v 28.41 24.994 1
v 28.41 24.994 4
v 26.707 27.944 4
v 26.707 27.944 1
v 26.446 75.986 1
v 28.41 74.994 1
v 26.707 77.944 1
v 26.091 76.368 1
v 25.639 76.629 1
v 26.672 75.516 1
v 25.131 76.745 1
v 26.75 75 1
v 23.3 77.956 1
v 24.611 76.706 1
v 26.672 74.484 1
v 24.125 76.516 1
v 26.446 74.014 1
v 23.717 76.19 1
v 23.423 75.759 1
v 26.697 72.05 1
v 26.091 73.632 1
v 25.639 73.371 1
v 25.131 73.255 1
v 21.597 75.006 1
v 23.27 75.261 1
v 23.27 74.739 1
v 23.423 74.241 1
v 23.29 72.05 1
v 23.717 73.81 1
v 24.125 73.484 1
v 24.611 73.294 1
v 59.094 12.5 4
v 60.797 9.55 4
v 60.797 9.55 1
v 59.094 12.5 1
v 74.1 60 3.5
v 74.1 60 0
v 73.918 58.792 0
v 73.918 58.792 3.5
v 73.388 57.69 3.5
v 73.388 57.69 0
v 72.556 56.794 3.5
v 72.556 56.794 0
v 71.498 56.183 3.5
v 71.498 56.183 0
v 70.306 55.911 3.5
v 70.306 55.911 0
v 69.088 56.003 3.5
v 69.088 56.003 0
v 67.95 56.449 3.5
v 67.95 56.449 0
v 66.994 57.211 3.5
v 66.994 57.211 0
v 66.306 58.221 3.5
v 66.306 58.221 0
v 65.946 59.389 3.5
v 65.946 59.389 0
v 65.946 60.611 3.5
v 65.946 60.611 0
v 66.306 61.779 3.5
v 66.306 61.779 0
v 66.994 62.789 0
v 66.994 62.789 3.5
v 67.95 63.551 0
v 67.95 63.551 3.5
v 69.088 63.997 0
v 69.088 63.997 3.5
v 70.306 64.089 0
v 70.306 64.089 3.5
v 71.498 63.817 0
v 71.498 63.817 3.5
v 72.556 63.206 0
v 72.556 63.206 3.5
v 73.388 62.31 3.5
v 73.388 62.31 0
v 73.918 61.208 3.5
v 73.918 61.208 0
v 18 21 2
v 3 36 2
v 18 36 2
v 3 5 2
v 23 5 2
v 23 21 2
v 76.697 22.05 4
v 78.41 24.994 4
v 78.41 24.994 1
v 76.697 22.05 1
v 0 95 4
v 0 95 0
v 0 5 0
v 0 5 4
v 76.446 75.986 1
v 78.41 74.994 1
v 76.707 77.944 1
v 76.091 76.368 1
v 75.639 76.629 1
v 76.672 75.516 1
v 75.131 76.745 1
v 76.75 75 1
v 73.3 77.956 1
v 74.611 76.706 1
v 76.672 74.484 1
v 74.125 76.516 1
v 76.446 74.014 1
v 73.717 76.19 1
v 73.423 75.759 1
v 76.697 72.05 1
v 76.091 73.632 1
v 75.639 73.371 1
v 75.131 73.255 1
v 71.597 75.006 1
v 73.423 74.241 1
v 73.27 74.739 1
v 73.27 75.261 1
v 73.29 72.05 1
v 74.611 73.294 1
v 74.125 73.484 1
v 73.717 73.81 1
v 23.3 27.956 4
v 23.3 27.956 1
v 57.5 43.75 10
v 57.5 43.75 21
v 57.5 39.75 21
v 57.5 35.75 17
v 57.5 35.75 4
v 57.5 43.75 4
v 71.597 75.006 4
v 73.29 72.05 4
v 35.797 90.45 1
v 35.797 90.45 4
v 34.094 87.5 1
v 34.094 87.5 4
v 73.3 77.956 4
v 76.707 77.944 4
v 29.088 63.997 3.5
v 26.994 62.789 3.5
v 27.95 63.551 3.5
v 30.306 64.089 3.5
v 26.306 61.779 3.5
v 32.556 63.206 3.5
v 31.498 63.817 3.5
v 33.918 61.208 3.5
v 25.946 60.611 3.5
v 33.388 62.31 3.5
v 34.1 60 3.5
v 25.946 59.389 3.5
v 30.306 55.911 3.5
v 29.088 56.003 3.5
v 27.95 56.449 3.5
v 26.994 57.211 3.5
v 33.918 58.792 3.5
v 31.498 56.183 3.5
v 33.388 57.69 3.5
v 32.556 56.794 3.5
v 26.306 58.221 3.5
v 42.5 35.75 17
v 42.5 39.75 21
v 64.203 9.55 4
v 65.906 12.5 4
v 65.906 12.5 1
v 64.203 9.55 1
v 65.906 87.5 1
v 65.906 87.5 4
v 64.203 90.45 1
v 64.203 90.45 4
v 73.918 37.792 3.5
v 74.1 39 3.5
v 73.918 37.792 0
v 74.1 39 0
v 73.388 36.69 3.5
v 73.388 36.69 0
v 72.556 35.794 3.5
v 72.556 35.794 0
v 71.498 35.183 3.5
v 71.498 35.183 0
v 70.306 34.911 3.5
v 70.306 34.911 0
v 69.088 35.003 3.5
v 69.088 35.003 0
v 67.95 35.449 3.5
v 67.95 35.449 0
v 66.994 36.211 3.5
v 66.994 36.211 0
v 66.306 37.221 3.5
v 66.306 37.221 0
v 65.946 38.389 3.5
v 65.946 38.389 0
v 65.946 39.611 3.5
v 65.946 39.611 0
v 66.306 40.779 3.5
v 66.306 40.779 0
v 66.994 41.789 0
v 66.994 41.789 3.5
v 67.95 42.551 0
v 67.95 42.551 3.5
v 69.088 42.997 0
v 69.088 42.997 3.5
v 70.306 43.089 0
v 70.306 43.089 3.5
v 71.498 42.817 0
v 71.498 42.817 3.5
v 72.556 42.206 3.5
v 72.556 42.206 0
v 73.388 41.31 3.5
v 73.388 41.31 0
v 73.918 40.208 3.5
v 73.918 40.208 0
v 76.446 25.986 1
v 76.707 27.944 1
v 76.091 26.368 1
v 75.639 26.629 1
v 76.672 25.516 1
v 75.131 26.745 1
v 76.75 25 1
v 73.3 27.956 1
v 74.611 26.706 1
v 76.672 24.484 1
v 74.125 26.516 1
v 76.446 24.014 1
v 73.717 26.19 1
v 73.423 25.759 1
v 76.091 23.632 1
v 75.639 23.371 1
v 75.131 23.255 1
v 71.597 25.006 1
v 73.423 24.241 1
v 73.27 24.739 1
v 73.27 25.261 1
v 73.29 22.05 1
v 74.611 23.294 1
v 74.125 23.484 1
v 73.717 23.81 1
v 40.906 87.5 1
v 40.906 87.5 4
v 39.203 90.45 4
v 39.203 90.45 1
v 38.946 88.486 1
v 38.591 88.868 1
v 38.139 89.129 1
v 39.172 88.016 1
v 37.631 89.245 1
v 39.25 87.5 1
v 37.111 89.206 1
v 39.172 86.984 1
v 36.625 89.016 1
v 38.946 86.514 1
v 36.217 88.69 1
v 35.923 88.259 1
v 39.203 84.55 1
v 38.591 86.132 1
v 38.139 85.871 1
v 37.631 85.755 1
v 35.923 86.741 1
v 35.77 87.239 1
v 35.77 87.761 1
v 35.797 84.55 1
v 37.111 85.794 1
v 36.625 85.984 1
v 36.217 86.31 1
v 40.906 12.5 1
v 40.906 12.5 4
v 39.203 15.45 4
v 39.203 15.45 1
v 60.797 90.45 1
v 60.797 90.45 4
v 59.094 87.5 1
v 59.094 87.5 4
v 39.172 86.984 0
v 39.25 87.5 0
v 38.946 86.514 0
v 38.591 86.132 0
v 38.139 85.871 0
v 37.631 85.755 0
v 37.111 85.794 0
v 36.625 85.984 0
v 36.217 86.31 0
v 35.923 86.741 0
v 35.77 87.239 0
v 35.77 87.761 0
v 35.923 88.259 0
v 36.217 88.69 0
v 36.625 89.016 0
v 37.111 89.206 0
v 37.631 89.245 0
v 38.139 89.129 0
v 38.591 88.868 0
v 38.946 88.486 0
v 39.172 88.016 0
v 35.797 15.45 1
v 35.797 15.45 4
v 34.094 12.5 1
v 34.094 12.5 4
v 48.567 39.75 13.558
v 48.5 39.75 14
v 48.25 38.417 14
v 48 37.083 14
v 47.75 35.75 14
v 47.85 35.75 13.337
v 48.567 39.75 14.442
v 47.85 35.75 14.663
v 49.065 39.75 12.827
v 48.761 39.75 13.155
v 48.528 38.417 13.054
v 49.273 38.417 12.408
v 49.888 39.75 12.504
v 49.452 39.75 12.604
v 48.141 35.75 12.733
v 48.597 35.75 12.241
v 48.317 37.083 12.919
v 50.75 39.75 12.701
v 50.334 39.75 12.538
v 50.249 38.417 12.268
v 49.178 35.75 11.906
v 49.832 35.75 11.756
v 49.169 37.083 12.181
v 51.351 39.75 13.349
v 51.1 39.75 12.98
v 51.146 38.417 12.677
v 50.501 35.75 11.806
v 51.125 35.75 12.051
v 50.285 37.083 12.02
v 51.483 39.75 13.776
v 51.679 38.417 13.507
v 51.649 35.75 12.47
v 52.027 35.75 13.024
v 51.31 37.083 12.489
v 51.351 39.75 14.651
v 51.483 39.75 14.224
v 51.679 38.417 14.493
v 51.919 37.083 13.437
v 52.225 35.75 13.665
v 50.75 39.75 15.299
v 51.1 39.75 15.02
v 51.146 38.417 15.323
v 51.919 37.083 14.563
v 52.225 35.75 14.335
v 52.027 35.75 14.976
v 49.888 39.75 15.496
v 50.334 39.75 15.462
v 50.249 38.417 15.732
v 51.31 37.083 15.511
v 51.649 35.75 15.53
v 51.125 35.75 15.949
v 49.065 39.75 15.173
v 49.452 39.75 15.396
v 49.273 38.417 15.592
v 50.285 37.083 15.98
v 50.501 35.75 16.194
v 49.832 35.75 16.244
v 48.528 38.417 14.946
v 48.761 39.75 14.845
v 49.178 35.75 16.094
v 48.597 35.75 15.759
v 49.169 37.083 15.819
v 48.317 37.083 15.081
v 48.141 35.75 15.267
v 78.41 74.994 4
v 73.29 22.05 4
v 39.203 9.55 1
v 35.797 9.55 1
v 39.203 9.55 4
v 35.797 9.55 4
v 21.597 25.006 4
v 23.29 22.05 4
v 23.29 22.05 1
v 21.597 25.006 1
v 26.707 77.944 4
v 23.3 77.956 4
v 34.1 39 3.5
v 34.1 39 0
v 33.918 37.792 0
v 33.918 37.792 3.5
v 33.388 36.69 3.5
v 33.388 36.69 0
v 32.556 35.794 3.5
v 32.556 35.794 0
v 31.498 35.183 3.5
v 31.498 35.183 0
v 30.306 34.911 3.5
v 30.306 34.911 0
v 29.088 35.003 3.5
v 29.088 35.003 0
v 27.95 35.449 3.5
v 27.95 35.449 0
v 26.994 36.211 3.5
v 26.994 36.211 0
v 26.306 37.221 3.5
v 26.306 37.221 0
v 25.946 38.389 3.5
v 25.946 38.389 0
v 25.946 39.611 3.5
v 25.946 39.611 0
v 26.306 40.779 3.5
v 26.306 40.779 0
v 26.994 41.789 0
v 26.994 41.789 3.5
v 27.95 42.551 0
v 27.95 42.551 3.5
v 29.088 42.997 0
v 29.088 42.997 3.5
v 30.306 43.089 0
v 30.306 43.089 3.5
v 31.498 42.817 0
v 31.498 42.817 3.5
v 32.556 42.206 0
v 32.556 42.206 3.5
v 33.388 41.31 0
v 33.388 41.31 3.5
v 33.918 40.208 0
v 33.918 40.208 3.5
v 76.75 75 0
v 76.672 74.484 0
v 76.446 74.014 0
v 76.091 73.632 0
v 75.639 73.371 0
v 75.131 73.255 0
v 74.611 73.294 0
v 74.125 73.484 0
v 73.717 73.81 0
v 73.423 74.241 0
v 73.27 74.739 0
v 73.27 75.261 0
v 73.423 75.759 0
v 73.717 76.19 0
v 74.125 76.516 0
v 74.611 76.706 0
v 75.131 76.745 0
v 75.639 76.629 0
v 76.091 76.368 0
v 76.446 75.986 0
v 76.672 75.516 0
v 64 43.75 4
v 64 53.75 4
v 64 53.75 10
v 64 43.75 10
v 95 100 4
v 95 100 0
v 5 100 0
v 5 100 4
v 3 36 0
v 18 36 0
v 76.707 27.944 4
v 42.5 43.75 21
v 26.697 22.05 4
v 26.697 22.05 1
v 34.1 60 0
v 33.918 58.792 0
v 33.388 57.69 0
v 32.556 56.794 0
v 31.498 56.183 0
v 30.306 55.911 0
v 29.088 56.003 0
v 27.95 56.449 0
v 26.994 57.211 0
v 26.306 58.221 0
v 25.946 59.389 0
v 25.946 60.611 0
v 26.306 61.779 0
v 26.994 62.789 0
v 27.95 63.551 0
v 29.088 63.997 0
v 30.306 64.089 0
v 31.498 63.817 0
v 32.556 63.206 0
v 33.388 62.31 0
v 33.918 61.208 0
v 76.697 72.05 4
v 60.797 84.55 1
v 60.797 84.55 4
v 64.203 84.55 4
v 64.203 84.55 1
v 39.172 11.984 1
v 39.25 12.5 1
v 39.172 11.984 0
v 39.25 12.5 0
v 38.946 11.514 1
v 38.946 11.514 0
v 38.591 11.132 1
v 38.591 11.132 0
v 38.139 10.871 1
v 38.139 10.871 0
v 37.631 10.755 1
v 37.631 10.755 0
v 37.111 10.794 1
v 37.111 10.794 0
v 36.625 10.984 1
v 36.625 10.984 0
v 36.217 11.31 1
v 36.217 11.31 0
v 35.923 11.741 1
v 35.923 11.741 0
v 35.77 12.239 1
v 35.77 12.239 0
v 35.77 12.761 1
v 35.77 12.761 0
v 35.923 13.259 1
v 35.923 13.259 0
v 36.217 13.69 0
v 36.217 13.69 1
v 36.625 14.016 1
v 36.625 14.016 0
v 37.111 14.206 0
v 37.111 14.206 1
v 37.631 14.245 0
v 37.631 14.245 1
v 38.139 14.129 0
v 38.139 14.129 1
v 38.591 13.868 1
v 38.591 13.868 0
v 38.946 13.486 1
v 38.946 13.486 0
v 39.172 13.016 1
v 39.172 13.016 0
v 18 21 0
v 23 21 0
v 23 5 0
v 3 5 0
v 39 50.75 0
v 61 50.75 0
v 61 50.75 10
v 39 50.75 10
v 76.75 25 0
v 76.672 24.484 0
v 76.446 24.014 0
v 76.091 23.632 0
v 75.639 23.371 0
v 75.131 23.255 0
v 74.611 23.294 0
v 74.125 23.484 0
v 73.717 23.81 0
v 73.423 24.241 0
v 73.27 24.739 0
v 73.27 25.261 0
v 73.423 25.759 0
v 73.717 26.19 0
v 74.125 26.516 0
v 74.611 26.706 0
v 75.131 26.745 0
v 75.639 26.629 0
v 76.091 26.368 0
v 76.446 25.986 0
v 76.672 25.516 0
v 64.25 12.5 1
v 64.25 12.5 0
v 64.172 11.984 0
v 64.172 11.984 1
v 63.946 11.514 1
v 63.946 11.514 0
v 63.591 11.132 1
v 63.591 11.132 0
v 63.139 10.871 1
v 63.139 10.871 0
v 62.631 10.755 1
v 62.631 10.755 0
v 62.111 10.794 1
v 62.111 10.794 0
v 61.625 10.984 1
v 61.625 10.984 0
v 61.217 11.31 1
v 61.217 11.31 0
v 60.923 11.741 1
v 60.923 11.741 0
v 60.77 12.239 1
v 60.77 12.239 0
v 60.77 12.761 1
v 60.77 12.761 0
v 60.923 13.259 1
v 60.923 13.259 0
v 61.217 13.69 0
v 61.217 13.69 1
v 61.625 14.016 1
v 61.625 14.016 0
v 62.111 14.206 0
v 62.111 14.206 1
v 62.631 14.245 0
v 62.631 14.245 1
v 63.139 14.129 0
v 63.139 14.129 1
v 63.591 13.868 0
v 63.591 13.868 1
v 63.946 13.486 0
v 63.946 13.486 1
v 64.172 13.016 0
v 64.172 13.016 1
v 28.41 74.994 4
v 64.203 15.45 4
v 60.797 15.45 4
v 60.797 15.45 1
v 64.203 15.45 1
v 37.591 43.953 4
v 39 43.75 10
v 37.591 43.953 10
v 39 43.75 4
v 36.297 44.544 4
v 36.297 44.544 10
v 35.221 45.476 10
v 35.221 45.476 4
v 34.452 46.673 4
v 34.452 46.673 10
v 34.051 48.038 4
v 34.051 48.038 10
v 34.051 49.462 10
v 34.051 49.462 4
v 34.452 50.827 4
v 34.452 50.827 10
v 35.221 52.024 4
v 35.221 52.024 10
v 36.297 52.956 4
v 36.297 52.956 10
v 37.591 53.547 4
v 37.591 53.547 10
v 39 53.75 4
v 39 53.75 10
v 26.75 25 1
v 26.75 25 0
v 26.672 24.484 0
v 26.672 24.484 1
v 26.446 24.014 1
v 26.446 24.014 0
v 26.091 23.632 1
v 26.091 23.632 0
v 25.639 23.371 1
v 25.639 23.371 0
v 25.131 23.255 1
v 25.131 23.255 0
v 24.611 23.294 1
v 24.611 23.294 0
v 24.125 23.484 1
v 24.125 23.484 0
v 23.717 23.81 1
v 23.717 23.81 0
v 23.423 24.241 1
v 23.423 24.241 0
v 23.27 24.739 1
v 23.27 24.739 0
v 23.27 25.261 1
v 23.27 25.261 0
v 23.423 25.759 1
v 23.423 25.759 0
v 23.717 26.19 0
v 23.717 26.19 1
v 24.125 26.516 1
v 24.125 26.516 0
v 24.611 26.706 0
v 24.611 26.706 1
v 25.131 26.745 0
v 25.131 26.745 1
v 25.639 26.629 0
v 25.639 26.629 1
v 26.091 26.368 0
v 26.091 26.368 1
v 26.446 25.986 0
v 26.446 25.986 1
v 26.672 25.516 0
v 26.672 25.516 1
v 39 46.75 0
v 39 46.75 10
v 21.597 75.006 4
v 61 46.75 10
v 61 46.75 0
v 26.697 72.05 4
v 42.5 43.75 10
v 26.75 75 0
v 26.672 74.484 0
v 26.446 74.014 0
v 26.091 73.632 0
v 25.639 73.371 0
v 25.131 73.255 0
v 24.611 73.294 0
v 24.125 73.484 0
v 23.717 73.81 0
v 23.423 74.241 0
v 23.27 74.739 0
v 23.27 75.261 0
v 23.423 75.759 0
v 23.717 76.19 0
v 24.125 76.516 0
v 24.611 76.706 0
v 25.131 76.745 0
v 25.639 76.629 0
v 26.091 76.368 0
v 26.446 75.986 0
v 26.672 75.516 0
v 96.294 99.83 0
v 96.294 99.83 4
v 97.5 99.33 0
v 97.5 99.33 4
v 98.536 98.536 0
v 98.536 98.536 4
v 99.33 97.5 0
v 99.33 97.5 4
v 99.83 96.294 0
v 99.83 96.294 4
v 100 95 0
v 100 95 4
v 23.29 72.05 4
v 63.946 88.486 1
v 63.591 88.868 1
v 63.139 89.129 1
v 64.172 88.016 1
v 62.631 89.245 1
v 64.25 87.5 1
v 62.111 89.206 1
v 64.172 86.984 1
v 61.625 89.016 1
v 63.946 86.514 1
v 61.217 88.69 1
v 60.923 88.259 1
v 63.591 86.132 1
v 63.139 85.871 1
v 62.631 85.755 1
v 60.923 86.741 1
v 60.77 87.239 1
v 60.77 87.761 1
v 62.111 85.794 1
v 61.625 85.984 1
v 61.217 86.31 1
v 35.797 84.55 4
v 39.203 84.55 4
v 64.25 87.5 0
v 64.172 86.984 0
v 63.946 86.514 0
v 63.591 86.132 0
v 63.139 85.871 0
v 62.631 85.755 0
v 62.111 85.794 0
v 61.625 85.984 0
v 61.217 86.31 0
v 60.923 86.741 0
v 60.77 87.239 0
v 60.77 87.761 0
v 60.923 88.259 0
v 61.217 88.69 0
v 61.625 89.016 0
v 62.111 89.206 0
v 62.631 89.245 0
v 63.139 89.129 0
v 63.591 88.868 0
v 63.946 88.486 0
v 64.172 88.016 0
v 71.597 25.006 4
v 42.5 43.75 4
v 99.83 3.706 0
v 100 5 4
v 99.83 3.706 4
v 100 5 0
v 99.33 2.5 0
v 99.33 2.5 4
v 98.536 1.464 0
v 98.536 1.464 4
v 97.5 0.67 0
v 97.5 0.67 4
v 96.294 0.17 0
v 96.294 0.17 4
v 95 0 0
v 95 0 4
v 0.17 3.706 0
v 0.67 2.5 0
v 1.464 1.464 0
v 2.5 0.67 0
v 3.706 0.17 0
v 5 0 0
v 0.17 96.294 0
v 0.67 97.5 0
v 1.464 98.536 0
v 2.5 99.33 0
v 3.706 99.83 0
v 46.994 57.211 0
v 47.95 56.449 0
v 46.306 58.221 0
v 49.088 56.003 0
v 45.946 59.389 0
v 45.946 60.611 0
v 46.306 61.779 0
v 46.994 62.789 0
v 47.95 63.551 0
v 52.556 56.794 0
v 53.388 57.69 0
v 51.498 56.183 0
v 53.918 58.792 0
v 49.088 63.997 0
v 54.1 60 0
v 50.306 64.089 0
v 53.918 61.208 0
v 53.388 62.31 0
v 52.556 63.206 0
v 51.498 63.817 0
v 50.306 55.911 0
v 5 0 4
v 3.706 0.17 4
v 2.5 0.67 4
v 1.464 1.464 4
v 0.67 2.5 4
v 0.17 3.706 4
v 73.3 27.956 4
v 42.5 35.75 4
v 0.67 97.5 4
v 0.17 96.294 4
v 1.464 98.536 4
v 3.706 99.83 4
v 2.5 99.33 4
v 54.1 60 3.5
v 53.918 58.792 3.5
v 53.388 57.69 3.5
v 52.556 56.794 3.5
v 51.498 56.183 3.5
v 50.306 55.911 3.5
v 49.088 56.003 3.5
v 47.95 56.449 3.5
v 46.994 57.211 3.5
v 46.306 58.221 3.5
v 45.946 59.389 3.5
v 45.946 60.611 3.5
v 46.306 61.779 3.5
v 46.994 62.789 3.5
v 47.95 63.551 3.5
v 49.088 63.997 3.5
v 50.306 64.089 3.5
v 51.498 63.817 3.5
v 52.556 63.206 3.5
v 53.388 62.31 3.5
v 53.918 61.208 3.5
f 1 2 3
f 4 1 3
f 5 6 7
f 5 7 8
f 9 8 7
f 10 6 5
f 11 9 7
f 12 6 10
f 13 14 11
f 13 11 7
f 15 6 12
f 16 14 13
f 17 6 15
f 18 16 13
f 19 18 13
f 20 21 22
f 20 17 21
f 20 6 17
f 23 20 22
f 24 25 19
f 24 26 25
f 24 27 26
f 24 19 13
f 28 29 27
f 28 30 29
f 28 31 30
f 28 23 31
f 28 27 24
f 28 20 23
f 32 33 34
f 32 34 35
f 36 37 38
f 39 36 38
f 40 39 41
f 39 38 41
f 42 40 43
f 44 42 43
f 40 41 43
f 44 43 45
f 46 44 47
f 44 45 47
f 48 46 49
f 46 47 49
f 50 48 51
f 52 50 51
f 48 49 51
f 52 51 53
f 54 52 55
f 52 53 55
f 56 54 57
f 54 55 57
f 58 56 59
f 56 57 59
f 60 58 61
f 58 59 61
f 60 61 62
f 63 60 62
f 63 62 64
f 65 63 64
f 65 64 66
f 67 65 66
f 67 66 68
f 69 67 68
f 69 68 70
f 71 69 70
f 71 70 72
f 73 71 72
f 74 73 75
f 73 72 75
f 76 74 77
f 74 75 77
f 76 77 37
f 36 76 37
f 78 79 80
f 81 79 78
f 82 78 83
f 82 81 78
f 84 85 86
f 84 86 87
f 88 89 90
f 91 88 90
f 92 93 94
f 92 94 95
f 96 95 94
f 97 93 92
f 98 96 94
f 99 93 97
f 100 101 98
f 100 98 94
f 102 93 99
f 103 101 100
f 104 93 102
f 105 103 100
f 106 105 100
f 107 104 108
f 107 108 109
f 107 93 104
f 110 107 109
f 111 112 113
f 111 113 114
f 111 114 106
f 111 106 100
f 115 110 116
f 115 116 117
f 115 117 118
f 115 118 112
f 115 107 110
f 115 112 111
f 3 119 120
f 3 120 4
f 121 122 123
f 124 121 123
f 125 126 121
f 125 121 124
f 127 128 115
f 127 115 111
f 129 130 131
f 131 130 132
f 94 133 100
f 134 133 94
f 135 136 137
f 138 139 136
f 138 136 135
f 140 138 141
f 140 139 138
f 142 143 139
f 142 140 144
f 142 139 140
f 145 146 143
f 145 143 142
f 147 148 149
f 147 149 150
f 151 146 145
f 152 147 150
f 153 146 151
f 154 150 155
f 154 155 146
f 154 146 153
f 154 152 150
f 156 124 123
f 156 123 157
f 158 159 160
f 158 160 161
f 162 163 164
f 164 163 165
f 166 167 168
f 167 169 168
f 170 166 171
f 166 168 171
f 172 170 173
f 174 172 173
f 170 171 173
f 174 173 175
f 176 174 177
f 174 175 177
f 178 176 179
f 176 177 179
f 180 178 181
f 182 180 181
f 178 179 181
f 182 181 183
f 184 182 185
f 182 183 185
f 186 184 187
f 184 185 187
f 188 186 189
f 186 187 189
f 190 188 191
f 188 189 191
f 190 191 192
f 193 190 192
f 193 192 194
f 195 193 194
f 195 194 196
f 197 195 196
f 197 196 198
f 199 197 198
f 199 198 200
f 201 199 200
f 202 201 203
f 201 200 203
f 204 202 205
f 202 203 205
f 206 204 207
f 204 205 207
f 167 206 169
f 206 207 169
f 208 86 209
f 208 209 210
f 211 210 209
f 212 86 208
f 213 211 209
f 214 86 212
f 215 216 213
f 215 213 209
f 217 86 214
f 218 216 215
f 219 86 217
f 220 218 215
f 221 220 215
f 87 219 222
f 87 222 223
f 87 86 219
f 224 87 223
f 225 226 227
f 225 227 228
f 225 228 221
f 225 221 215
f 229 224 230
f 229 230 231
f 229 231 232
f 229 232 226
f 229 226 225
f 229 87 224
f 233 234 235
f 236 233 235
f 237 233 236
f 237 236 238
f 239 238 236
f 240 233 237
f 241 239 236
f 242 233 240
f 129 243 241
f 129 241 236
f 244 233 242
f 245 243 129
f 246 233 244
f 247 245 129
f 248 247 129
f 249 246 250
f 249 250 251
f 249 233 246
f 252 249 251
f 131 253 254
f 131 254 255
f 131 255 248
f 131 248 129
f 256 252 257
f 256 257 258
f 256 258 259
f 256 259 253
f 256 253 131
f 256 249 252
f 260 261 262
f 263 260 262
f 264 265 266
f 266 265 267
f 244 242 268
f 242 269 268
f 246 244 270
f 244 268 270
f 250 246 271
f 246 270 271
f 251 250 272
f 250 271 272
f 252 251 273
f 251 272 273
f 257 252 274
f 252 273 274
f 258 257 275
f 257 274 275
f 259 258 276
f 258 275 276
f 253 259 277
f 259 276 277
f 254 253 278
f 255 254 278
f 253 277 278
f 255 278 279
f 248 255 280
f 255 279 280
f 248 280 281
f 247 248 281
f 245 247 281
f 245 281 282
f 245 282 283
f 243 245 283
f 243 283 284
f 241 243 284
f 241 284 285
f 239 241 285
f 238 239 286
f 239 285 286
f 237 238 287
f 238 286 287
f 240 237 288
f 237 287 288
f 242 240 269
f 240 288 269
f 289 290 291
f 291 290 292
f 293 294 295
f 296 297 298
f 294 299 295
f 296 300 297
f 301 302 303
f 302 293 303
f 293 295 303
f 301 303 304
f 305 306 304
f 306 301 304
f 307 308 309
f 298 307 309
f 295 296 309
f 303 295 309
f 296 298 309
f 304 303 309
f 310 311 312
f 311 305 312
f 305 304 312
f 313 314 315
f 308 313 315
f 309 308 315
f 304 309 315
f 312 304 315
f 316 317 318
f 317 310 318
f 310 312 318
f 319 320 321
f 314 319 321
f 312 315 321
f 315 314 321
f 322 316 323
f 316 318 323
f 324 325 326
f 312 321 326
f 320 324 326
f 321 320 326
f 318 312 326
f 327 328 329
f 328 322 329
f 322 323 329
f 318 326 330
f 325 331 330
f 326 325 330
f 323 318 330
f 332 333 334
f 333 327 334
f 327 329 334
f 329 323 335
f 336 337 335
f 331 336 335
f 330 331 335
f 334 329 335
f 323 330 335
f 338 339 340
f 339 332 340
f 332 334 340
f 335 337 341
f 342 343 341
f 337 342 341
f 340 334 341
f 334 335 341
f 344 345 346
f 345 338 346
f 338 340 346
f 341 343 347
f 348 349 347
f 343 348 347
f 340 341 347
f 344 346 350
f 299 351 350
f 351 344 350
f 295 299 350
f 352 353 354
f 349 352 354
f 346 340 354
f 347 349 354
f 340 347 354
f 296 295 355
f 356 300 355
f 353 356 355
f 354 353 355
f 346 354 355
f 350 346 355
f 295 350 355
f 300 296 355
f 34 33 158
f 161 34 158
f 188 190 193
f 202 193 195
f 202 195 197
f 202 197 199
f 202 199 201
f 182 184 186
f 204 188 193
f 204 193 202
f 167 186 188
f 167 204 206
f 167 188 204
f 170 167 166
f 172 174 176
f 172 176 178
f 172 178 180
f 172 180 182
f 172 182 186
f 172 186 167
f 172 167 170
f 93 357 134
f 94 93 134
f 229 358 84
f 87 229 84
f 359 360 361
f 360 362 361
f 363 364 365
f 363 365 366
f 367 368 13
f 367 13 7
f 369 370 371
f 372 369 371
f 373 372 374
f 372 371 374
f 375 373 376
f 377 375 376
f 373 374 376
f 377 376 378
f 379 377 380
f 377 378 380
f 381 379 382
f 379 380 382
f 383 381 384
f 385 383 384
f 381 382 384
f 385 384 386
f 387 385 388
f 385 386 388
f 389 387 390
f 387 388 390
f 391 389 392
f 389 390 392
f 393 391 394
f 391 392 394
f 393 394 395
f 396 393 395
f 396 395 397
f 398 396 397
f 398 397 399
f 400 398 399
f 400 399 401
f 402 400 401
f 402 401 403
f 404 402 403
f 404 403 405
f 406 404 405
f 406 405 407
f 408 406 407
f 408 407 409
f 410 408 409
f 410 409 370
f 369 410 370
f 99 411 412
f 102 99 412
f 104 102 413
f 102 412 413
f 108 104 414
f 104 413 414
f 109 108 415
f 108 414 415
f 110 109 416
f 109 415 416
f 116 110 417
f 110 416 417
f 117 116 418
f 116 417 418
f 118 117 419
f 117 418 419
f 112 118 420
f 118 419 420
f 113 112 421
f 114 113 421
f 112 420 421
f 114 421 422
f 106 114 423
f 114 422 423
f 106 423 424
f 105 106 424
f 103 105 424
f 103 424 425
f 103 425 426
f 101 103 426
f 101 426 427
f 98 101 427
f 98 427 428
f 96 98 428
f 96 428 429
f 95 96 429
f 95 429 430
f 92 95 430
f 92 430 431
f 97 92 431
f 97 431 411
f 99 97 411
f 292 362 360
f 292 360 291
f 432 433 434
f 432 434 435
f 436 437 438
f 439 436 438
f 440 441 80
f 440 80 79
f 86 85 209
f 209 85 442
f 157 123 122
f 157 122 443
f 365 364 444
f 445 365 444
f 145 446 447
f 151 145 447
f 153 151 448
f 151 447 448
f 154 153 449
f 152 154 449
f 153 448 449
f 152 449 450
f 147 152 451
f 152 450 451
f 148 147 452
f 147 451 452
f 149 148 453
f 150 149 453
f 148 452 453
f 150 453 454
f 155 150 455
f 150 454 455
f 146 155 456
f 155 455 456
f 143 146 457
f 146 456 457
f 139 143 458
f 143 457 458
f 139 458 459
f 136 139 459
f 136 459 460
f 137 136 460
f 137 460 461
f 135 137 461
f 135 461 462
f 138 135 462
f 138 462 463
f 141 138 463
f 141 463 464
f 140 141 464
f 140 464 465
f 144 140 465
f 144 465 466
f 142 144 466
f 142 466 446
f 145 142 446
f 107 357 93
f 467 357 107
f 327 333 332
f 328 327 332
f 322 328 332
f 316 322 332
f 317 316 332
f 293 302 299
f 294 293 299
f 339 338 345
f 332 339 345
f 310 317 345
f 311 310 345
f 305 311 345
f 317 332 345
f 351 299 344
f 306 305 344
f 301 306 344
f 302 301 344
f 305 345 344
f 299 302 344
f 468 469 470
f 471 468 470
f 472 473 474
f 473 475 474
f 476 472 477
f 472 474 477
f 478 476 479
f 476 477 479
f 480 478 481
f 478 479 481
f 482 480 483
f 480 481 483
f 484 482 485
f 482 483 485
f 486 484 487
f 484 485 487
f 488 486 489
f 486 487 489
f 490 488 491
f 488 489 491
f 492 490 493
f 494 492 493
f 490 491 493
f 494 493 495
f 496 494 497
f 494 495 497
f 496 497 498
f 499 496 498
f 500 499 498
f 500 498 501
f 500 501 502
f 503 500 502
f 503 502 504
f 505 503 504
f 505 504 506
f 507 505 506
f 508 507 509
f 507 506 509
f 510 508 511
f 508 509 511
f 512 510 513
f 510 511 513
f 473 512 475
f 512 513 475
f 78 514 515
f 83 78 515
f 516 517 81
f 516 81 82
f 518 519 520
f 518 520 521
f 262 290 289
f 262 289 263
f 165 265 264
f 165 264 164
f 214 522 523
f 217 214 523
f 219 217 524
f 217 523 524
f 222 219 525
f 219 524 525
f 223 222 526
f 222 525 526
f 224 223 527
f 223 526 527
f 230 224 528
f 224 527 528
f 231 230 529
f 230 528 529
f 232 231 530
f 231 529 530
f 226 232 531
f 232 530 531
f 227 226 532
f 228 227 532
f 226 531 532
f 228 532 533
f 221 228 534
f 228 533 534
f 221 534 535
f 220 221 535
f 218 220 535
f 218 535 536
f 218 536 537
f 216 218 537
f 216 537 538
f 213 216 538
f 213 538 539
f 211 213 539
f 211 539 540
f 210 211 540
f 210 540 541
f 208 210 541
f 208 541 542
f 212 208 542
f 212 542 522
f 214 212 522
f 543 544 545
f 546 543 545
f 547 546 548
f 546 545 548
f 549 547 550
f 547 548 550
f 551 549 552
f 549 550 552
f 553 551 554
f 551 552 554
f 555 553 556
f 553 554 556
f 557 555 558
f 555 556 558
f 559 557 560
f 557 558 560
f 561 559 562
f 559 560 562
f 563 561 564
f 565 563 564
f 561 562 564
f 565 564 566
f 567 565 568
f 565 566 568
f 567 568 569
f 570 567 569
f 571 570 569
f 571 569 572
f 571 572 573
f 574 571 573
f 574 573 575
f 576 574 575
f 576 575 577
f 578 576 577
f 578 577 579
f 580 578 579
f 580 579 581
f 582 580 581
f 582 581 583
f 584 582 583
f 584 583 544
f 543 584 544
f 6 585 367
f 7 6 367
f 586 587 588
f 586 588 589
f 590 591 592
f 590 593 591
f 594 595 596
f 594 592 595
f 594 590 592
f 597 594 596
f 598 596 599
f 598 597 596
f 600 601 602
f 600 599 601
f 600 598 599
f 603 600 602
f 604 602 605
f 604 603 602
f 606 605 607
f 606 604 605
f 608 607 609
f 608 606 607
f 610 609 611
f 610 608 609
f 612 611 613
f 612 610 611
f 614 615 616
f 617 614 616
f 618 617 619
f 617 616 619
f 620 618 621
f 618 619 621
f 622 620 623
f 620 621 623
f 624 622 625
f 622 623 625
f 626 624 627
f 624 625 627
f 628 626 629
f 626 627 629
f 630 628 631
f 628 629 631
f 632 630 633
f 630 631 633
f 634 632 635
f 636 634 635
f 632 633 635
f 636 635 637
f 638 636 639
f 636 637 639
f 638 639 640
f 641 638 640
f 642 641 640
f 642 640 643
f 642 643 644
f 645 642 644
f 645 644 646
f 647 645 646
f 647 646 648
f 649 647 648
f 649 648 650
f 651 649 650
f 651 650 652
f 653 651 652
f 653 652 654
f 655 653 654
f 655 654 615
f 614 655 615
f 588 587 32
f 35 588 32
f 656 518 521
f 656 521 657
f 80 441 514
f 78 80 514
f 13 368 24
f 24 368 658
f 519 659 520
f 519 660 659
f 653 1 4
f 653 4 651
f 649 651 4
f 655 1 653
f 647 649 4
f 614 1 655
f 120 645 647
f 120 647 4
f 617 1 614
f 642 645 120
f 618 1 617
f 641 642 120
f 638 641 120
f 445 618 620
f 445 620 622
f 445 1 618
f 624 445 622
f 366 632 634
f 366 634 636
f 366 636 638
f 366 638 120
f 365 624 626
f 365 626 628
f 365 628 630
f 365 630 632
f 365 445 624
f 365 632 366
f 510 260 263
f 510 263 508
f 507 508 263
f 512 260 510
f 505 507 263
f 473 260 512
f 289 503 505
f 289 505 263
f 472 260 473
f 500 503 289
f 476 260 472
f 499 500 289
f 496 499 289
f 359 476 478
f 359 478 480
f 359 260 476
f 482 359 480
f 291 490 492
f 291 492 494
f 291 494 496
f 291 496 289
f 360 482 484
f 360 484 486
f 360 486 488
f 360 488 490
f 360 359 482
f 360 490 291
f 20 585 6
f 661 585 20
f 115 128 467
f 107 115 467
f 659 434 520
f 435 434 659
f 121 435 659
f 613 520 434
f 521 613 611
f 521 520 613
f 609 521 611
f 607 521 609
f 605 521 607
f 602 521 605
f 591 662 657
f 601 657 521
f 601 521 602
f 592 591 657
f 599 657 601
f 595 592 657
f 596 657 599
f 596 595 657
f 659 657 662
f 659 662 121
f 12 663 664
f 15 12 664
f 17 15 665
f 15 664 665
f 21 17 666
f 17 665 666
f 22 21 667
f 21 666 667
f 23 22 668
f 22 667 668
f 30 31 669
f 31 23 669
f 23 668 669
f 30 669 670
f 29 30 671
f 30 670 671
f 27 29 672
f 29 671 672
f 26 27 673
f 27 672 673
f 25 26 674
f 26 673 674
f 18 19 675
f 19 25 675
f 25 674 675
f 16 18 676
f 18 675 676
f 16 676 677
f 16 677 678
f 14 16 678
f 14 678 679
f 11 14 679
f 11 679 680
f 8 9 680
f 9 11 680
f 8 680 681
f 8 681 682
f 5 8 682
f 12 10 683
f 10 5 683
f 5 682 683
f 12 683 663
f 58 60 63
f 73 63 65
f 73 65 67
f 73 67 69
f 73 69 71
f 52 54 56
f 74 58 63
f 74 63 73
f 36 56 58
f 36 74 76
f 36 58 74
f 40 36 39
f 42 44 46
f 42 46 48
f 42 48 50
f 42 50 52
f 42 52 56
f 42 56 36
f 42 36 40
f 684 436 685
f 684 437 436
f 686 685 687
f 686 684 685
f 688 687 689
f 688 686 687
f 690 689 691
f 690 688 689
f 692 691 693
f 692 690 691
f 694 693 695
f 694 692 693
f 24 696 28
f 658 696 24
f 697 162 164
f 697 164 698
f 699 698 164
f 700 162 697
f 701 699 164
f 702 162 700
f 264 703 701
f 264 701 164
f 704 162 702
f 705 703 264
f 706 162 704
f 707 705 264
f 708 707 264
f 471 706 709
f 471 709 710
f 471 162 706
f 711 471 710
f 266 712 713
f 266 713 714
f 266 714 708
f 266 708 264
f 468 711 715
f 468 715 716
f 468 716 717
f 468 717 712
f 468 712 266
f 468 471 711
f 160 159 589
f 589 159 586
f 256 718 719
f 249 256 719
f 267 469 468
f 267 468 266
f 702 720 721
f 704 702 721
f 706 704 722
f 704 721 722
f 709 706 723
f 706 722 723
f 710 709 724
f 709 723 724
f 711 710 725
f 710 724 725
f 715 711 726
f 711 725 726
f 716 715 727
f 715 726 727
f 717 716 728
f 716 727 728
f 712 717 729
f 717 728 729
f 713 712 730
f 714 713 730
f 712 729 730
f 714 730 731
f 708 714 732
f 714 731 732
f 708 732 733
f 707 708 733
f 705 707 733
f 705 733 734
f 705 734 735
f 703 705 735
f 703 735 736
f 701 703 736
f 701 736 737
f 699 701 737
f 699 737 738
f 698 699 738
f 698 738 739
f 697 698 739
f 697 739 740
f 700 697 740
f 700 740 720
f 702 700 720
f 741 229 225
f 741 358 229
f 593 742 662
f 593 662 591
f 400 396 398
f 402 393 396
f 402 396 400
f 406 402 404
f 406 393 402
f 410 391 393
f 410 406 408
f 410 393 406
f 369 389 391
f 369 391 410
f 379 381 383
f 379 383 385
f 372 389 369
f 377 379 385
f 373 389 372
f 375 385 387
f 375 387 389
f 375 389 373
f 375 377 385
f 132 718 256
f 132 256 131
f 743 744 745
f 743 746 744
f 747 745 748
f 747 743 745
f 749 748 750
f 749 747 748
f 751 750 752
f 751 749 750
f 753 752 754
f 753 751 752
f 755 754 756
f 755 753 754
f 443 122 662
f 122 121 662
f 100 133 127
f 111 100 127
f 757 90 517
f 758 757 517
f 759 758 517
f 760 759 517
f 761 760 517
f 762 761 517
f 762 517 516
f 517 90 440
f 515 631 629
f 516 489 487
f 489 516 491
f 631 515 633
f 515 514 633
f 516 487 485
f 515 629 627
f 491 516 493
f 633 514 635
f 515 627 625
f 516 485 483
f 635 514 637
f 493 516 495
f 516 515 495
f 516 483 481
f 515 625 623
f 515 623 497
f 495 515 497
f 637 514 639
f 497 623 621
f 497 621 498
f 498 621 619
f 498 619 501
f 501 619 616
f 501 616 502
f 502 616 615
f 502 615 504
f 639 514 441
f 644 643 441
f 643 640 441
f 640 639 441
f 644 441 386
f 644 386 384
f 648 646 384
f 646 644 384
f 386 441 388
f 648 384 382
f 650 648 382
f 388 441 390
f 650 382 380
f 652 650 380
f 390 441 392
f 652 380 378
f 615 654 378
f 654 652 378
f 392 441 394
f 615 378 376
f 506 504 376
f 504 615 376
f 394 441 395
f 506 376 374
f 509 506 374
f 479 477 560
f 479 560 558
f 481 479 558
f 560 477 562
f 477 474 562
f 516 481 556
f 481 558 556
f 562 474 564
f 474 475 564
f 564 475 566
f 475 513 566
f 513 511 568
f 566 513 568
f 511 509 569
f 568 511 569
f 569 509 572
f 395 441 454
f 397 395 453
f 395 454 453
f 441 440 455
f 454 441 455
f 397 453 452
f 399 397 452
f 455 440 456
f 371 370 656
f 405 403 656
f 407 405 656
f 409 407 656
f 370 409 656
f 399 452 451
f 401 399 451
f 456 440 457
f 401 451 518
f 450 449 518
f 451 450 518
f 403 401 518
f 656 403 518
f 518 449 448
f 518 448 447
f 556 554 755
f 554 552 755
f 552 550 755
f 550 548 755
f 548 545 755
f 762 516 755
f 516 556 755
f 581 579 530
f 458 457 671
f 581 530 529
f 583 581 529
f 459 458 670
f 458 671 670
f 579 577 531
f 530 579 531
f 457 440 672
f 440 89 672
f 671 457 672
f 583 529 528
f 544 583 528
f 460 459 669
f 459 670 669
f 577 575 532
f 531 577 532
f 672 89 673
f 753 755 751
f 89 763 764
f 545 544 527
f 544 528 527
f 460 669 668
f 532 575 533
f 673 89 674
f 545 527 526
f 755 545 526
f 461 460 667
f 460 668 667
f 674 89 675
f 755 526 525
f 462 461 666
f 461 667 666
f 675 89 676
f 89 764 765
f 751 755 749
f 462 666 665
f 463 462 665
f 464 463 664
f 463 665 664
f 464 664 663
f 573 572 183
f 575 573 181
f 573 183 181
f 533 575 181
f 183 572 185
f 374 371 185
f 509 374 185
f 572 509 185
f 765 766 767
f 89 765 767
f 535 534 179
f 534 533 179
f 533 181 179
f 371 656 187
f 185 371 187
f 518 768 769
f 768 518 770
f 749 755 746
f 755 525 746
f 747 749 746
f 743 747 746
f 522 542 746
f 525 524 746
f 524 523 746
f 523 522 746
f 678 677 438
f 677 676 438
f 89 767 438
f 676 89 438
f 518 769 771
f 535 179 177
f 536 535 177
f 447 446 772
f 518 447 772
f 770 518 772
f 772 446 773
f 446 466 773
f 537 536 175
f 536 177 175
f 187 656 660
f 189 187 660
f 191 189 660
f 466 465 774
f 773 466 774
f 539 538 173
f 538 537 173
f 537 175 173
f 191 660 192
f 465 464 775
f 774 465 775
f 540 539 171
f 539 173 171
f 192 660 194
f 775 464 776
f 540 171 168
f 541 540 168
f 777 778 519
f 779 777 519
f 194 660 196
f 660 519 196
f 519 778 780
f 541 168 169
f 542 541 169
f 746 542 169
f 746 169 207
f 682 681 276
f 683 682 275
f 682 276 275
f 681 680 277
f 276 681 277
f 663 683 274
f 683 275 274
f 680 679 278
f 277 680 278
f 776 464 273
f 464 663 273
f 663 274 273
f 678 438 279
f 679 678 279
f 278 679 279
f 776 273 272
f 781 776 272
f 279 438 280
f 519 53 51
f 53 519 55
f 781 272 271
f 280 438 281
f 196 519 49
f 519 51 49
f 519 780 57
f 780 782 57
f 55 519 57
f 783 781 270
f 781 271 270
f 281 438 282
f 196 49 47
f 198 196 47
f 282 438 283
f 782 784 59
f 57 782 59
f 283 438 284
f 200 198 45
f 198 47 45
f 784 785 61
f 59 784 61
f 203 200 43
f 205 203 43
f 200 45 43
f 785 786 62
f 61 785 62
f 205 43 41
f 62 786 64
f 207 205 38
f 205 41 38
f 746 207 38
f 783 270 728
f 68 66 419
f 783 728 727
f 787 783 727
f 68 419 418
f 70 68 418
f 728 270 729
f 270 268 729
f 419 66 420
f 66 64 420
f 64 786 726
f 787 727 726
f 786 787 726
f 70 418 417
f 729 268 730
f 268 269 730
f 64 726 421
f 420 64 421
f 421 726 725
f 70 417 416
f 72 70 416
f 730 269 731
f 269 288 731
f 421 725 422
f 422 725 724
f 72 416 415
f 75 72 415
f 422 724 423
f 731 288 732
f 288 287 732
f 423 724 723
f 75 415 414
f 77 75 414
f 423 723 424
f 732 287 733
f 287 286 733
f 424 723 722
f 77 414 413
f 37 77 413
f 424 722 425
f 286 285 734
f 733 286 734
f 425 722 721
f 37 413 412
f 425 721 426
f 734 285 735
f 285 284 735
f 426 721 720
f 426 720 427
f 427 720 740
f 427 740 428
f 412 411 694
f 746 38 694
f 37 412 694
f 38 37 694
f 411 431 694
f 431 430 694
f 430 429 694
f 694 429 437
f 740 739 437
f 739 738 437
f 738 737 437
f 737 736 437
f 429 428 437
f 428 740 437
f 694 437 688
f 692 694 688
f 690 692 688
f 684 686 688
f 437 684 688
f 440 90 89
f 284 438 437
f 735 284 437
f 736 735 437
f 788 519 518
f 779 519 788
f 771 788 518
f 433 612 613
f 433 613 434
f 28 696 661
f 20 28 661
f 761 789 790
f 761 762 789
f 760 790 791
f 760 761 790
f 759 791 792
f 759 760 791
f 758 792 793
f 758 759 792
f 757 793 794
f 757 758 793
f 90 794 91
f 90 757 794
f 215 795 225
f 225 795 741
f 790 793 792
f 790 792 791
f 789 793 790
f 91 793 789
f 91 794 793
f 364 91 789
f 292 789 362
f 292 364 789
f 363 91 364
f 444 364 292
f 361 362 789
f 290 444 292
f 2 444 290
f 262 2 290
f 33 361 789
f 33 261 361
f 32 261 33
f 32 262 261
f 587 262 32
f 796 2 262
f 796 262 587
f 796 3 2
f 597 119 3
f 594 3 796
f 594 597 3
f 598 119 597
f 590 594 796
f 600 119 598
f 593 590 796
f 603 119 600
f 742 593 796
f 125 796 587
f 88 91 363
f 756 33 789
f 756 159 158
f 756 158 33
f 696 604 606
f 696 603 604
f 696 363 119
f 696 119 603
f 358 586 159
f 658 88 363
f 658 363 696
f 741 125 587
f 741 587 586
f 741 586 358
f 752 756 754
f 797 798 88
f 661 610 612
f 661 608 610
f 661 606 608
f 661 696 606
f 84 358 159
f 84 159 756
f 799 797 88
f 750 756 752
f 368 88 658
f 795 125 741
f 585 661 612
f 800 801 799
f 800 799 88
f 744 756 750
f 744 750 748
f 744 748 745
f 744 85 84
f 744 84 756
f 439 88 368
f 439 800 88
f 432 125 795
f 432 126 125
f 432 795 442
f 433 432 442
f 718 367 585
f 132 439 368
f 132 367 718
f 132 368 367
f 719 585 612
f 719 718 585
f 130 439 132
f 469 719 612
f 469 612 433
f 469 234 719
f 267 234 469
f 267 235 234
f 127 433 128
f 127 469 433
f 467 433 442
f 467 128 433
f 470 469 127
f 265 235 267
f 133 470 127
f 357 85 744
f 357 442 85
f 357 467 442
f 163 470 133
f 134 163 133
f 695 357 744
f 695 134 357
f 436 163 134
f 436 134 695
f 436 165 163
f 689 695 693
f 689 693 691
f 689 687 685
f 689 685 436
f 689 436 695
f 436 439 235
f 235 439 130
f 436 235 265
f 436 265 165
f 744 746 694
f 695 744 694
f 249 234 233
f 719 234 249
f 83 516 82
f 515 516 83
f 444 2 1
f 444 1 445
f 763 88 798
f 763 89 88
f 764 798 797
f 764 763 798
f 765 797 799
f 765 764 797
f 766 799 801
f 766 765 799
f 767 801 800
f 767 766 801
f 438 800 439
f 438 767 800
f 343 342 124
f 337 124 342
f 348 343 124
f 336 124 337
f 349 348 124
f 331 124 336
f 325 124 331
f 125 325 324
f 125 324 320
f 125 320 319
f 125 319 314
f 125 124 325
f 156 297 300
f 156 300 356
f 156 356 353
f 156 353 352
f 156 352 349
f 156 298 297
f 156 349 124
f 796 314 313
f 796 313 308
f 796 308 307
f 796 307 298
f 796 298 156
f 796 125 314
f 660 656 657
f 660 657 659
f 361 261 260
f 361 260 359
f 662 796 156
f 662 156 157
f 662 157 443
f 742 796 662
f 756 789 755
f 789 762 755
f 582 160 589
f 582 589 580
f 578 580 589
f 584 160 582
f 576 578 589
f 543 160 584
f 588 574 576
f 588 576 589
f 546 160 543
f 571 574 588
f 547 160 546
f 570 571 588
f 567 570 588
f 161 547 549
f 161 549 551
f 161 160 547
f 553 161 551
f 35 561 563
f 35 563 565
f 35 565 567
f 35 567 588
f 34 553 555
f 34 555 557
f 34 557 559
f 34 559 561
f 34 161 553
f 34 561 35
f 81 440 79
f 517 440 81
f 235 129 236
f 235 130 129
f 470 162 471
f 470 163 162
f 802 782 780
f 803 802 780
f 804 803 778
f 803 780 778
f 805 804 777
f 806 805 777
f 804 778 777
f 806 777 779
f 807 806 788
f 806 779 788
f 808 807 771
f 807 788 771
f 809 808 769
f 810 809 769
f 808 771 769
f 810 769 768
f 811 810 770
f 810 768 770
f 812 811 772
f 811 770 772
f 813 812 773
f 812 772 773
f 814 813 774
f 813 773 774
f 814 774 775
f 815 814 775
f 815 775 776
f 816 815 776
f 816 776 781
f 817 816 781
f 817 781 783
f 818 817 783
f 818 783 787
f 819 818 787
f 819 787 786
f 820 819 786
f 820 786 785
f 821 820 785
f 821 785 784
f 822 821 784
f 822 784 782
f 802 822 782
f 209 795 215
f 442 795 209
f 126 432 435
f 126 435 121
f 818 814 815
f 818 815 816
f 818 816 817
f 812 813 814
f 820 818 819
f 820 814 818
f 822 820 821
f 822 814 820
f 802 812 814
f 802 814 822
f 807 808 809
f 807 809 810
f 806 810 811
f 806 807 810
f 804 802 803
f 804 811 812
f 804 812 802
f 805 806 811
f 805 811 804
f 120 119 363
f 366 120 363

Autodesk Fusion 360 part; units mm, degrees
sketch "Skizze1" plane through (0, 0, 0) normal (0, 0, 1) x (1, 0, 0)
  line L0 (0, 0) -> (100, 0)
  line L1 (100, 0) -> (100, 100)
  line L2 (100, 100) -> (0, 100)
  line L3 (0, 100) -> (0, 0)
  circle A0 centre (5, 95) radius 5
  circle A1 centre (5, 5) radius 5
  circle A2 centre (95, 5) radius 5
  circle A3 centre (95, 95) radius 5
  line L4 (39, 46.75) -> (61, 46.75)
  line L5 (61, 46.75) -> (61, 50.75)
  line L6 (61, 50.75) -> (39, 50.75)
  line L7 (39, 50.75) -> (39, 46.75)
  line L8 (39, 48.75) -> (61, 48.75)
  line L9 (50, 50.75) -> (50, 46.75)
  dimension "d1" = 100
  dimension "d2" = 100
  dimension "d5" = 22
  dimension "d6" = 4
  dimension "d7" = 50
  dimension "d8" = 48.75
extrude "Extrusion1" add sketch "Skizze1" along normal blind 4 contours L0 L1 L2 L3 A0 A1 A2 A3 | A1 | A2 | A0 | A3
sketch "Skizze2" plane through (0, 0, 4) normal (0, 0, 1) x (-1, 0, 0)
  line L0 (-39, -46.75) -> (-39, -50.75)
  line L1 (-39, -50.75) -> (-61, -50.75)
  line L2 (-61, -50.75) -> (-61, -46.75)
  line L3 (-61, -46.75) -> (-39, -46.75)
  arc A0 (-100, -95) -> (-95, -100) centre (-95, -95) ccw
  line L4 (-95, -100) -> (-5, -100)
  arc A1 (-5, -100) -> (0, -95) centre (-5, -95) ccw
  line L5 (0, -95) -> (0, -5)
  arc A2 (0, -5) -> (-5, 0) centre (-5, -5) ccw
  line L6 (-5, 0) -> (-95, 0)
  arc A3 (-95, 0) -> (-100, -5) centre (-95, -5) ccw
  line L7 (-100, -5) -> (-100, -95)
  line L8 (-39, -53.75) -> (-64, -53.75)
  line L9 (-64, -53.75) -> (-64, -43.75)
  line L10 (-64, -43.75) -> (-39, -43.75)
  line L11 (-39, -43.75) -> (-39, -53.75)
  line L12 (-39, -48.75) -> (-42, -48.75)
  arc A4 (-39, -53.75) -> (-39, -43.75) centre (-39, -48.75) ccw
  dimension "d9" = 3
  dimension "d10" = 3
  dimension "d11" = 3
extrude "Extrusion2" add sketch "Skizze2" along normal blind 6 contours L0 L11 A4 | L1 L2 L3 L8 L9 L10 L11
sketch "Skizze3" plane through (0, 0, 0) normal (0, 0, -1) x (1, 0, 0)
  line L0 (39, -50.75) -> (39, -46.75)
  line L1 (39, -46.75) -> (61, -46.75)
  line L2 (61, -46.75) -> (61, -50.75)
  line L3 (61, -50.75) -> (39, -50.75)
  arc A0 (95, -100) -> (100, -95) centre (95, -95) ccw
  line L4 (100, -95) -> (100, -5)
  arc A1 (100, -5) -> (95, 0) centre (95, -5) ccw
  line L5 (95, 0) -> (5, 0)
  arc A2 (5, 0) -> (0, -5) centre (5, -5) ccw
  line L6 (0, -5) -> (0, -95)
  arc A3 (0, -95) -> (5, -100) centre (5, -95) ccw
  line L7 (5, -100) -> (95, -100)
  line L8 (23, -36) -> (3, -36)
  line L9 (3, -36) -> (3, -5)
  line L10 (3, -5) -> (23, -5)
  line L11 (23, -5) -> (23, -36)
  line L12 (23, -36) -> (18, -36)
  line L13 (18, -36) -> (18, -21)
  line L14 (18, -21) -> (23, -21)
  line L15 (23, -21) -> (23, -36)
  dimension "d15" = 20
  dimension "d16" = 31
  dimension "d17" = 5
  dimension "d18" = 3
  dimension "d62" = 5
  dimension "d63" = 15
extrude "Extrusion3" cut sketch "Skizze3" against normal blind 2 contours L8 L9 L10 L11 L13 L14
sketch "Skizze4" plane through (0, 0, 0) normal (0, 0, -1) x (1, 0, 0)
  line L0 (3, -36) -> (3, -5)
  line L1 (3, -5) -> (23, -5)
  line L2 (23, -5) -> (23, -21)
  line L3 (18, -36) -> (3, -36)
  line L4 (39, -50.75) -> (39, -46.75)
  line L5 (39, -46.75) -> (61, -46.75)
  line L6 (61, -46.75) -> (61, -50.75)
  line L7 (61, -50.75) -> (39, -50.75)
  arc A0 (95, -100) -> (100, -95) centre (95, -95) ccw
  line L8 (100, -95) -> (100, -5)
  arc A1 (100, -5) -> (95, 0) centre (95, -5) ccw
  line L9 (95, 0) -> (5, 0)
  arc A2 (5, 0) -> (0, -5) centre (5, -5) ccw
  line L10 (0, -5) -> (0, -95)
  arc A3 (0, -95) -> (5, -100) centre (5, -95) ccw
  line L11 (5, -100) -> (95, -100)
  line L12 (25, -25) -> (75, -25)
  line L13 (75, -25) -> (75, -75)
  line L14 (75, -75) -> (25, -75)
  line L15 (25, -75) -> (25, -25)
  circle A4 centre (25, -25) radius 1.75
  circle A5 centre (75, -25) radius 1.75
  circle A6 centre (75, -75) radius 1.75
  circle A7 centre (25, -75) radius 1.75
  line L16 (37.5, -12.5) -> (62.5, -12.5)
  line L17 (62.5, -12.5) -> (62.5, -87.5)
  line L18 (62.5, -87.5) -> (37.5, -87.5)
  line L19 (37.5, -87.5) -> (37.5, -12.5)
  circle A8 centre (37.5, -12.5) radius 1.75
  circle A9 centre (62.5, -12.5) radius 1.75
  circle A10 centre (62.5, -87.5) radius 1.75
  circle A11 centre (37.5, -87.5) radius 1.75
  line L20 (23, -21) -> (18, -21)
  line L21 (18, -21) -> (18, -36)
  dimension "d21" = 50
  dimension "d22" = 50
  dimension "d23" = 25
  dimension "d24" = 25
  dimension "d25" = 3.5
  dimension "d26" = 3.5
  dimension "d27" = 3.5
  dimension "d28" = 3.5
  dimension "d29" = 25
  dimension "d30" = 75
  dimension "d31" = 12.5
  dimension "d32" = 37.5
  dimension "d33" = 3.5
  dimension "d34" = 3.5
  dimension "d35" = 3.5
  dimension "d36" = 3.5
extrude "Extrusion4" cut sketch "Skizze4" against normal blind 4 contours L12 L15 A4 | L12 L15 A4 | L14 L15 A7 | L14 L15 A7 | L16 L19 A8 | L16 L19 A8 | L12 L13 A5 | L12 L13 A5 | L16 L17 A9 | L16 L17 A9 | L18 L19 A11 | L18 L19 A11 | L13 L14 A6 | L13 L14 A6 | L17 L18 A10 | L17 L18 A10
sketch "Skizze5" plane through (0, 0, 4) normal (0, 0, 1) x (-1, 0, 0)
  circle A0 centre (-37.5, -87.5) radius 1.75
  circle A1 centre (-25, -75) radius 1.75
  line L0 (-64, -53.75) -> (-64, -43.75)
  line L1 (-64, -43.75) -> (-39, -43.75)
  arc A2 (-39, -53.75) -> (-39, -43.75) centre (-39, -48.75) ccw
  line L2 (-39, -53.75) -> (-64, -53.75)
  arc A3 (-100, -95) -> (-95, -100) centre (-95, -95) ccw
  line L3 (-95, -100) -> (-5, -100)
  arc A4 (-5, -100) -> (0, -95) centre (-5, -95) ccw
  line L4 (0, -95) -> (0, -5)
  arc A5 (0, -5) -> (-5, 0) centre (-5, -5) ccw
  line L5 (-5, 0) -> (-95, 0)
  arc A6 (-95, 0) -> (-100, -5) centre (-95, -5) ccw
  line L6 (-100, -5) -> (-100, -95)
  line L7 (-34, -90.45) -> (-42, -90.45)
  line L8 (-34, -84.55) -> (-43, -84.55)
  line L9 (-20.1646, -77.9663) -> (-28.1646, -77.9393)
  line L10 (-20.1651, -72.05) -> (-29.1651, -72.05)
  line L11 (0, -50) -> (-100, -50)
  line L12 (-50, -100) -> (-50, 0)
  circle A7 centre (-50, -50) radius 3
  line L13 (-36.6952, -82.9939) -> (-32.6952, -89.9221)
  line L14 (-41.8048, -85.9439) -> (-37.3048, -93.7381)
  line L15 (-41.8048, -89.0561) -> (-37.8048, -82.1279)
  line L16 (-36.6952, -92.0061) -> (-32.1952, -84.2119)
  line L17 (-24.8488, -69.3292) -> (-20.8722, -76.2709)
  line L18 (-29.9722, -72.2879) -> (-25.4722, -80.0821)
  line L19 (-29.9866, -77.7044) -> (-25.9633, -70.7897)
  line L20 (-24.8627, -80.6621) -> (-20.3627, -72.8679)
  line L21 (-79.9722, -72.2879) -> (-75.4722, -80.0821)
  line L22 (-70.1646, -77.9663) -> (-78.1646, -77.9393)
  line L23 (-74.8627, -80.6621) -> (-70.3627, -72.8679)
  line L24 (-74.8488, -69.3292) -> (-70.8722, -76.2709)
  line L25 (-70.1651, -72.05) -> (-79.1651, -72.05)
  line L26 (-79.9866, -77.7044) -> (-75.9633, -70.7897)
  line L27 (-29.9722, -22.2879) -> (-25.4722, -30.0821)
  line L28 (-20.1646, -27.9663) -> (-28.1646, -27.9393)
  line L29 (-24.8627, -30.6621) -> (-20.3627, -22.8679)
  line L30 (-24.8488, -19.3292) -> (-20.8722, -26.2709)
  line L31 (-20.1651, -22.05) -> (-29.1651, -22.05)
  line L32 (-29.9866, -27.7044) -> (-25.9633, -20.7897)
  line L33 (-79.9722, -22.2879) -> (-75.4722, -30.0821)
  line L34 (-70.1646, -27.9663) -> (-78.1646, -27.9393)
  line L35 (-74.8627, -30.6621) -> (-70.3627, -22.8679)
  line L36 (-74.8488, -19.3292) -> (-70.8722, -26.2709)
  line L37 (-70.1651, -22.05) -> (-79.1651, -22.05)
  line L38 (-79.9866, -27.7044) -> (-75.9633, -20.7897)
  line L39 (-59, -84.55) -> (-68, -84.55)
  line L40 (-61.6952, -82.9939) -> (-57.6952, -89.9221)
  line L41 (-61.6952, -92.0061) -> (-57.1952, -84.2119)
  line L42 (-59, -90.45) -> (-67, -90.45)
  line L43 (-66.8048, -85.9439) -> (-62.3048, -93.7381)
  line L44 (-66.8048, -89.0561) -> (-62.8048, -82.1279)
  line L45 (-34, -9.55) -> (-43, -9.55)
  line L46 (-36.6952, -7.9939) -> (-32.6952, -14.9221)
  line L47 (-36.6952, -17.0061) -> (-32.1952, -9.2119)
  line L48 (-34, -15.45) -> (-42, -15.45)
  line L49 (-41.8048, -10.9439) -> (-37.3048, -18.7381)
  line L50 (-41.8048, -14.0561) -> (-37.8048, -7.1279)
  line L51 (-59, -9.55) -> (-68, -9.55)
  line L52 (-61.6952, -7.9939) -> (-57.6952, -14.9221)
  line L53 (-61.6952, -17.0061) -> (-57.1952, -9.2119)
  line L54 (-59, -15.45) -> (-67, -15.45)
  line L55 (-66.8048, -10.9439) -> (-62.3048, -18.7381)
  line L56 (-66.8048, -14.0561) -> (-62.8048, -7.1279)
  dimension "d40" = 2.95
  dimension "d41" = 2.95
  dimension "d42" = 2.95
  dimension "d43" = 2.95
  dimension "d78" = 360
  dimension "d80" = 360
  dimension "d83" = -50
  dimension "d84" = 50
  dimension "d87" = -25
  dimension "d88" = 75
extrude "Extrusion5" cut sketch "Skizze5" against normal blind 3 contours A0 | L7 L8 L13 L14 L15 L16 | L9 L10 L17 L18 L19 L20 | L21 L22 L23 L24 L25 L26 | L27 L28 L29 L30 L31 L32 | L33 L34 L35 L36 L37 L38 | L39 L40 L41 L42 L43 L44 | L45 L46 L47 L48 L49 L50 | L51 L52 L53 L54 L55 L56
sketch "Skizze6" plane through (0, 0, 4) normal (0, 0, 1) x (-1, 0, 0)
  line L0 (-26.6966, -72.05) -> (-23.2902, -72.05)
  line L1 (-23.3001, -77.9557) -> (-26.7065, -77.9443)
  line L2 (-39.2032, -84.55) -> (-35.7968, -84.55)
  line L3 (-35.7968, -90.45) -> (-39.2032, -90.45)
  line L4 (-64, -53.75) -> (-64, -43.75)
  line L5 (-64, -43.75) -> (-39, -43.75)
  arc A0 (-39, -53.75) -> (-39, -43.75) centre (-39, -48.75) ccw
  line L6 (-39, -53.75) -> (-64, -53.75)
  arc A1 (-100, -95) -> (-95, -100) centre (-95, -95) ccw
  line L7 (-95, -100) -> (-5, -100)
  arc A2 (-5, -100) -> (0, -95) centre (-5, -95) ccw
  line L8 (0, -95) -> (0, -5)
  arc A3 (0, -5) -> (-5, 0) centre (-5, -5) ccw
  line L9 (-5, 0) -> (-95, 0)
  arc A4 (-95, 0) -> (-100, -5) centre (-95, -5) ccw
  line L10 (-100, -5) -> (-100, -95)
  line L11 (-42.5, -43.75) -> (-57.5, -43.75)
  line L12 (-57.5, -43.75) -> (-57.5, -35.75)
  line L13 (-57.5, -35.75) -> (-42.5, -35.75)
  line L14 (-42.5, -35.75) -> (-42.5, -43.75)
  line L15 (-28.4097, -74.9943) -> (-26.6966, -72.05)
  line L16 (-23.2902, -72.05) -> (-21.5969, -75.0057)
  line L17 (-21.5969, -75.0057) -> (-23.3001, -77.9557)
  line L18 (-26.7065, -77.9443) -> (-28.4097, -74.9943)
  line L19 (-40.9064, -87.5) -> (-39.2032, -84.55)
  line L20 (-35.7968, -84.55) -> (-34.0936, -87.5)
  line L21 (-34.0936, -87.5) -> (-35.7968, -90.45)
  line L22 (-39.2032, -90.45) -> (-40.9064, -87.5)
  line L23 (-28.4097, -24.9943) -> (-26.6966, -22.05)
  line L24 (-26.6966, -22.05) -> (-23.2902, -22.05)
  line L25 (-23.2902, -22.05) -> (-21.5969, -25.0057)
  line L26 (-21.5969, -25.0057) -> (-23.3001, -27.9557)
  line L27 (-23.3001, -27.9557) -> (-26.7065, -27.9443)
  line L28 (-26.7065, -27.9443) -> (-28.4097, -24.9943)
  line L29 (-65.9064, -87.5) -> (-64.2032, -84.55)
  line L30 (-64.2032, -84.55) -> (-60.7968, -84.55)
  line L31 (-60.7968, -84.55) -> (-59.0936, -87.5)
  line L32 (-59.0936, -87.5) -> (-60.7968, -90.45)
  line L33 (-60.7968, -90.45) -> (-64.2032, -90.45)
  line L34 (-64.2032, -90.45) -> (-65.9064, -87.5)
  line L35 (-40.9064, -12.5) -> (-39.2032, -9.55)
  line L36 (-39.2032, -9.55) -> (-35.7968, -9.55)
  line L37 (-35.7968, -9.55) -> (-34.0936, -12.5)
  line L38 (-34.0936, -12.5) -> (-35.7968, -15.45)
  line L39 (-35.7968, -15.45) -> (-39.2032, -15.45)
  line L40 (-39.2032, -15.45) -> (-40.9064, -12.5)
  line L41 (-78.4097, -24.9943) -> (-76.6966, -22.05)
  line L42 (-76.6966, -22.05) -> (-73.2902, -22.05)
  line L43 (-73.2902, -22.05) -> (-71.5969, -25.0057)
  line L44 (-71.5969, -25.0057) -> (-73.3001, -27.9557)
  line L45 (-73.3001, -27.9557) -> (-76.7065, -27.9443)
  line L46 (-76.7065, -27.9443) -> (-78.4097, -24.9943)
  line L47 (-78.4097, -74.9943) -> (-76.6966, -72.05)
  line L48 (-76.6966, -72.05) -> (-73.2902, -72.05)
  line L49 (-73.2902, -72.05) -> (-71.5969, -75.0057)
  line L50 (-71.5969, -75.0057) -> (-73.3001, -77.9557)
  line L51 (-73.3001, -77.9557) -> (-76.7065, -77.9443)
  line L52 (-76.7065, -77.9443) -> (-78.4097, -74.9943)
  line L53 (-65.9064, -12.5) -> (-64.2032, -9.55)
  line L54 (-64.2032, -9.55) -> (-60.7968, -9.55)
  line L55 (-60.7968, -9.55) -> (-59.0936, -12.5)
  line L56 (-59.0936, -12.5) -> (-60.7968, -15.45)
  line L57 (-60.7968, -15.45) -> (-64.2032, -15.45)
  line L58 (-64.2032, -15.45) -> (-65.9064, -12.5)
  dimension "d64" = 15
  dimension "d65" = 42.5
  dimension "d66" = 8
extrude "Extrusion6" add sketch "Skizze6" along normal blind 10 contours L5 L11 L12 L13 L14
sketch "Skizze8" plane through (0, 0, 14) normal (0, 0, 1) x (-1, 0, 0)
  line L0 (-42.5, -35.75) -> (-57.5, -35.75)
  line L1 (-57.5, -35.75) -> (-57.5, -43.75)
  line L2 (-57.5, -43.75) -> (-42.5, -43.75)
  line L3 (-42.5, -43.75) -> (-42.5, -35.75)
  line L4 (-50, -35.75) -> (-50, -39.75)
  line L5 (-50, -39.75) -> (-48.5, -39.75)
  line L6 (-48.5, -39.75) -> (-47.75, -35.75)
  dimension "d70" = 4
  dimension "d71" = 1.5
  dimension "d72" = 2.25
extrude "Extrusion7" add sketch "Skizze8" along normal blind 7
revolve "Drehen1" cut sketch "Skizze8" angle 360 about axis through (50, 35.75, 14) along (0, 1, 0) contours L0 L4 L5 L6
chamfer "Fase1" distance 4 angle 45 1 edges at (50, 35.75, 21)
sketch "Skizze9" plane through (0, 0, 0) normal (0, 0, -1) x (1, 0, 0)
  circle A0 centre (37.5, -87.5) radius 1.75
  circle A1 centre (62.5, -12.5) radius 1.75
  circle A2 centre (75, -25) radius 1.75
  circle A3 centre (25, -75) radius 1.75
  circle A4 centre (62.5, -87.5) radius 1.75
  circle A5 centre (37.5, -12.5) radius 1.75
  circle A6 centre (75, -75) radius 1.75
  circle A7 centre (25, -25) radius 1.75
  line L0 (23, -21) -> (18, -21)
  line L1 (18, -21) -> (18, -36)
  line L2 (18, -36) -> (3, -36)
  line L3 (3, -36) -> (3, -5)
  line L4 (3, -5) -> (23, -5)
  line L5 (23, -5) -> (23, -21)
  line L6 (39, -50.75) -> (39, -46.75)
  line L7 (39, -46.75) -> (61, -46.75)
  line L8 (61, -46.75) -> (61, -50.75)
  line L9 (61, -50.75) -> (39, -50.75)
  arc A8 (95, -100) -> (100, -95) centre (95, -95) ccw
  line L10 (100, -95) -> (100, -5)
  arc A9 (100, -5) -> (95, 0) centre (95, -5) ccw
  line L11 (95, 0) -> (5, 0)
  arc A10 (5, 0) -> (0, -5) centre (5, -5) ccw
  line L12 (0, -5) -> (0, -95)
  arc A11 (0, -95) -> (5, -100) centre (5, -95) ccw
  line L13 (5, -100) -> (95, -100)
  circle A12 centre (30, -39) radius 4.1
  circle A13 centre (70, -39) radius 4.1
  circle A14 centre (70, -60) radius 4.1
  circle A15 centre (30, -60) radius 4.1
  circle A16 centre (50, -60) radius 4.1
  dimension "d89" = 8.2
  dimension "d90" = 8.2
  dimension "d91" = 8.2
  dimension "d92" = 8.2
  dimension "d93" = 8.2
  dimension "d94" = 40
  dimension "d95" = 40
  dimension "d96" = 40
  dimension "d97" = 39
  dimension "d98" = 39
  dimension "d99" = 30
  dimension "d100" = 30
  dimension "d101" = 30
  dimension "d102" = 50
  dimension "d103" = 30
extrude "Extrusion8" cut sketch "Skizze9" against normal blind 3.5 contours A12 | A13 | A14 | A15 | A16
equation "d8 = 50 mm - 1.25 mm"
equation "d65 = ( ( 100 - 15 ) / 2 ) * 1 mm"
